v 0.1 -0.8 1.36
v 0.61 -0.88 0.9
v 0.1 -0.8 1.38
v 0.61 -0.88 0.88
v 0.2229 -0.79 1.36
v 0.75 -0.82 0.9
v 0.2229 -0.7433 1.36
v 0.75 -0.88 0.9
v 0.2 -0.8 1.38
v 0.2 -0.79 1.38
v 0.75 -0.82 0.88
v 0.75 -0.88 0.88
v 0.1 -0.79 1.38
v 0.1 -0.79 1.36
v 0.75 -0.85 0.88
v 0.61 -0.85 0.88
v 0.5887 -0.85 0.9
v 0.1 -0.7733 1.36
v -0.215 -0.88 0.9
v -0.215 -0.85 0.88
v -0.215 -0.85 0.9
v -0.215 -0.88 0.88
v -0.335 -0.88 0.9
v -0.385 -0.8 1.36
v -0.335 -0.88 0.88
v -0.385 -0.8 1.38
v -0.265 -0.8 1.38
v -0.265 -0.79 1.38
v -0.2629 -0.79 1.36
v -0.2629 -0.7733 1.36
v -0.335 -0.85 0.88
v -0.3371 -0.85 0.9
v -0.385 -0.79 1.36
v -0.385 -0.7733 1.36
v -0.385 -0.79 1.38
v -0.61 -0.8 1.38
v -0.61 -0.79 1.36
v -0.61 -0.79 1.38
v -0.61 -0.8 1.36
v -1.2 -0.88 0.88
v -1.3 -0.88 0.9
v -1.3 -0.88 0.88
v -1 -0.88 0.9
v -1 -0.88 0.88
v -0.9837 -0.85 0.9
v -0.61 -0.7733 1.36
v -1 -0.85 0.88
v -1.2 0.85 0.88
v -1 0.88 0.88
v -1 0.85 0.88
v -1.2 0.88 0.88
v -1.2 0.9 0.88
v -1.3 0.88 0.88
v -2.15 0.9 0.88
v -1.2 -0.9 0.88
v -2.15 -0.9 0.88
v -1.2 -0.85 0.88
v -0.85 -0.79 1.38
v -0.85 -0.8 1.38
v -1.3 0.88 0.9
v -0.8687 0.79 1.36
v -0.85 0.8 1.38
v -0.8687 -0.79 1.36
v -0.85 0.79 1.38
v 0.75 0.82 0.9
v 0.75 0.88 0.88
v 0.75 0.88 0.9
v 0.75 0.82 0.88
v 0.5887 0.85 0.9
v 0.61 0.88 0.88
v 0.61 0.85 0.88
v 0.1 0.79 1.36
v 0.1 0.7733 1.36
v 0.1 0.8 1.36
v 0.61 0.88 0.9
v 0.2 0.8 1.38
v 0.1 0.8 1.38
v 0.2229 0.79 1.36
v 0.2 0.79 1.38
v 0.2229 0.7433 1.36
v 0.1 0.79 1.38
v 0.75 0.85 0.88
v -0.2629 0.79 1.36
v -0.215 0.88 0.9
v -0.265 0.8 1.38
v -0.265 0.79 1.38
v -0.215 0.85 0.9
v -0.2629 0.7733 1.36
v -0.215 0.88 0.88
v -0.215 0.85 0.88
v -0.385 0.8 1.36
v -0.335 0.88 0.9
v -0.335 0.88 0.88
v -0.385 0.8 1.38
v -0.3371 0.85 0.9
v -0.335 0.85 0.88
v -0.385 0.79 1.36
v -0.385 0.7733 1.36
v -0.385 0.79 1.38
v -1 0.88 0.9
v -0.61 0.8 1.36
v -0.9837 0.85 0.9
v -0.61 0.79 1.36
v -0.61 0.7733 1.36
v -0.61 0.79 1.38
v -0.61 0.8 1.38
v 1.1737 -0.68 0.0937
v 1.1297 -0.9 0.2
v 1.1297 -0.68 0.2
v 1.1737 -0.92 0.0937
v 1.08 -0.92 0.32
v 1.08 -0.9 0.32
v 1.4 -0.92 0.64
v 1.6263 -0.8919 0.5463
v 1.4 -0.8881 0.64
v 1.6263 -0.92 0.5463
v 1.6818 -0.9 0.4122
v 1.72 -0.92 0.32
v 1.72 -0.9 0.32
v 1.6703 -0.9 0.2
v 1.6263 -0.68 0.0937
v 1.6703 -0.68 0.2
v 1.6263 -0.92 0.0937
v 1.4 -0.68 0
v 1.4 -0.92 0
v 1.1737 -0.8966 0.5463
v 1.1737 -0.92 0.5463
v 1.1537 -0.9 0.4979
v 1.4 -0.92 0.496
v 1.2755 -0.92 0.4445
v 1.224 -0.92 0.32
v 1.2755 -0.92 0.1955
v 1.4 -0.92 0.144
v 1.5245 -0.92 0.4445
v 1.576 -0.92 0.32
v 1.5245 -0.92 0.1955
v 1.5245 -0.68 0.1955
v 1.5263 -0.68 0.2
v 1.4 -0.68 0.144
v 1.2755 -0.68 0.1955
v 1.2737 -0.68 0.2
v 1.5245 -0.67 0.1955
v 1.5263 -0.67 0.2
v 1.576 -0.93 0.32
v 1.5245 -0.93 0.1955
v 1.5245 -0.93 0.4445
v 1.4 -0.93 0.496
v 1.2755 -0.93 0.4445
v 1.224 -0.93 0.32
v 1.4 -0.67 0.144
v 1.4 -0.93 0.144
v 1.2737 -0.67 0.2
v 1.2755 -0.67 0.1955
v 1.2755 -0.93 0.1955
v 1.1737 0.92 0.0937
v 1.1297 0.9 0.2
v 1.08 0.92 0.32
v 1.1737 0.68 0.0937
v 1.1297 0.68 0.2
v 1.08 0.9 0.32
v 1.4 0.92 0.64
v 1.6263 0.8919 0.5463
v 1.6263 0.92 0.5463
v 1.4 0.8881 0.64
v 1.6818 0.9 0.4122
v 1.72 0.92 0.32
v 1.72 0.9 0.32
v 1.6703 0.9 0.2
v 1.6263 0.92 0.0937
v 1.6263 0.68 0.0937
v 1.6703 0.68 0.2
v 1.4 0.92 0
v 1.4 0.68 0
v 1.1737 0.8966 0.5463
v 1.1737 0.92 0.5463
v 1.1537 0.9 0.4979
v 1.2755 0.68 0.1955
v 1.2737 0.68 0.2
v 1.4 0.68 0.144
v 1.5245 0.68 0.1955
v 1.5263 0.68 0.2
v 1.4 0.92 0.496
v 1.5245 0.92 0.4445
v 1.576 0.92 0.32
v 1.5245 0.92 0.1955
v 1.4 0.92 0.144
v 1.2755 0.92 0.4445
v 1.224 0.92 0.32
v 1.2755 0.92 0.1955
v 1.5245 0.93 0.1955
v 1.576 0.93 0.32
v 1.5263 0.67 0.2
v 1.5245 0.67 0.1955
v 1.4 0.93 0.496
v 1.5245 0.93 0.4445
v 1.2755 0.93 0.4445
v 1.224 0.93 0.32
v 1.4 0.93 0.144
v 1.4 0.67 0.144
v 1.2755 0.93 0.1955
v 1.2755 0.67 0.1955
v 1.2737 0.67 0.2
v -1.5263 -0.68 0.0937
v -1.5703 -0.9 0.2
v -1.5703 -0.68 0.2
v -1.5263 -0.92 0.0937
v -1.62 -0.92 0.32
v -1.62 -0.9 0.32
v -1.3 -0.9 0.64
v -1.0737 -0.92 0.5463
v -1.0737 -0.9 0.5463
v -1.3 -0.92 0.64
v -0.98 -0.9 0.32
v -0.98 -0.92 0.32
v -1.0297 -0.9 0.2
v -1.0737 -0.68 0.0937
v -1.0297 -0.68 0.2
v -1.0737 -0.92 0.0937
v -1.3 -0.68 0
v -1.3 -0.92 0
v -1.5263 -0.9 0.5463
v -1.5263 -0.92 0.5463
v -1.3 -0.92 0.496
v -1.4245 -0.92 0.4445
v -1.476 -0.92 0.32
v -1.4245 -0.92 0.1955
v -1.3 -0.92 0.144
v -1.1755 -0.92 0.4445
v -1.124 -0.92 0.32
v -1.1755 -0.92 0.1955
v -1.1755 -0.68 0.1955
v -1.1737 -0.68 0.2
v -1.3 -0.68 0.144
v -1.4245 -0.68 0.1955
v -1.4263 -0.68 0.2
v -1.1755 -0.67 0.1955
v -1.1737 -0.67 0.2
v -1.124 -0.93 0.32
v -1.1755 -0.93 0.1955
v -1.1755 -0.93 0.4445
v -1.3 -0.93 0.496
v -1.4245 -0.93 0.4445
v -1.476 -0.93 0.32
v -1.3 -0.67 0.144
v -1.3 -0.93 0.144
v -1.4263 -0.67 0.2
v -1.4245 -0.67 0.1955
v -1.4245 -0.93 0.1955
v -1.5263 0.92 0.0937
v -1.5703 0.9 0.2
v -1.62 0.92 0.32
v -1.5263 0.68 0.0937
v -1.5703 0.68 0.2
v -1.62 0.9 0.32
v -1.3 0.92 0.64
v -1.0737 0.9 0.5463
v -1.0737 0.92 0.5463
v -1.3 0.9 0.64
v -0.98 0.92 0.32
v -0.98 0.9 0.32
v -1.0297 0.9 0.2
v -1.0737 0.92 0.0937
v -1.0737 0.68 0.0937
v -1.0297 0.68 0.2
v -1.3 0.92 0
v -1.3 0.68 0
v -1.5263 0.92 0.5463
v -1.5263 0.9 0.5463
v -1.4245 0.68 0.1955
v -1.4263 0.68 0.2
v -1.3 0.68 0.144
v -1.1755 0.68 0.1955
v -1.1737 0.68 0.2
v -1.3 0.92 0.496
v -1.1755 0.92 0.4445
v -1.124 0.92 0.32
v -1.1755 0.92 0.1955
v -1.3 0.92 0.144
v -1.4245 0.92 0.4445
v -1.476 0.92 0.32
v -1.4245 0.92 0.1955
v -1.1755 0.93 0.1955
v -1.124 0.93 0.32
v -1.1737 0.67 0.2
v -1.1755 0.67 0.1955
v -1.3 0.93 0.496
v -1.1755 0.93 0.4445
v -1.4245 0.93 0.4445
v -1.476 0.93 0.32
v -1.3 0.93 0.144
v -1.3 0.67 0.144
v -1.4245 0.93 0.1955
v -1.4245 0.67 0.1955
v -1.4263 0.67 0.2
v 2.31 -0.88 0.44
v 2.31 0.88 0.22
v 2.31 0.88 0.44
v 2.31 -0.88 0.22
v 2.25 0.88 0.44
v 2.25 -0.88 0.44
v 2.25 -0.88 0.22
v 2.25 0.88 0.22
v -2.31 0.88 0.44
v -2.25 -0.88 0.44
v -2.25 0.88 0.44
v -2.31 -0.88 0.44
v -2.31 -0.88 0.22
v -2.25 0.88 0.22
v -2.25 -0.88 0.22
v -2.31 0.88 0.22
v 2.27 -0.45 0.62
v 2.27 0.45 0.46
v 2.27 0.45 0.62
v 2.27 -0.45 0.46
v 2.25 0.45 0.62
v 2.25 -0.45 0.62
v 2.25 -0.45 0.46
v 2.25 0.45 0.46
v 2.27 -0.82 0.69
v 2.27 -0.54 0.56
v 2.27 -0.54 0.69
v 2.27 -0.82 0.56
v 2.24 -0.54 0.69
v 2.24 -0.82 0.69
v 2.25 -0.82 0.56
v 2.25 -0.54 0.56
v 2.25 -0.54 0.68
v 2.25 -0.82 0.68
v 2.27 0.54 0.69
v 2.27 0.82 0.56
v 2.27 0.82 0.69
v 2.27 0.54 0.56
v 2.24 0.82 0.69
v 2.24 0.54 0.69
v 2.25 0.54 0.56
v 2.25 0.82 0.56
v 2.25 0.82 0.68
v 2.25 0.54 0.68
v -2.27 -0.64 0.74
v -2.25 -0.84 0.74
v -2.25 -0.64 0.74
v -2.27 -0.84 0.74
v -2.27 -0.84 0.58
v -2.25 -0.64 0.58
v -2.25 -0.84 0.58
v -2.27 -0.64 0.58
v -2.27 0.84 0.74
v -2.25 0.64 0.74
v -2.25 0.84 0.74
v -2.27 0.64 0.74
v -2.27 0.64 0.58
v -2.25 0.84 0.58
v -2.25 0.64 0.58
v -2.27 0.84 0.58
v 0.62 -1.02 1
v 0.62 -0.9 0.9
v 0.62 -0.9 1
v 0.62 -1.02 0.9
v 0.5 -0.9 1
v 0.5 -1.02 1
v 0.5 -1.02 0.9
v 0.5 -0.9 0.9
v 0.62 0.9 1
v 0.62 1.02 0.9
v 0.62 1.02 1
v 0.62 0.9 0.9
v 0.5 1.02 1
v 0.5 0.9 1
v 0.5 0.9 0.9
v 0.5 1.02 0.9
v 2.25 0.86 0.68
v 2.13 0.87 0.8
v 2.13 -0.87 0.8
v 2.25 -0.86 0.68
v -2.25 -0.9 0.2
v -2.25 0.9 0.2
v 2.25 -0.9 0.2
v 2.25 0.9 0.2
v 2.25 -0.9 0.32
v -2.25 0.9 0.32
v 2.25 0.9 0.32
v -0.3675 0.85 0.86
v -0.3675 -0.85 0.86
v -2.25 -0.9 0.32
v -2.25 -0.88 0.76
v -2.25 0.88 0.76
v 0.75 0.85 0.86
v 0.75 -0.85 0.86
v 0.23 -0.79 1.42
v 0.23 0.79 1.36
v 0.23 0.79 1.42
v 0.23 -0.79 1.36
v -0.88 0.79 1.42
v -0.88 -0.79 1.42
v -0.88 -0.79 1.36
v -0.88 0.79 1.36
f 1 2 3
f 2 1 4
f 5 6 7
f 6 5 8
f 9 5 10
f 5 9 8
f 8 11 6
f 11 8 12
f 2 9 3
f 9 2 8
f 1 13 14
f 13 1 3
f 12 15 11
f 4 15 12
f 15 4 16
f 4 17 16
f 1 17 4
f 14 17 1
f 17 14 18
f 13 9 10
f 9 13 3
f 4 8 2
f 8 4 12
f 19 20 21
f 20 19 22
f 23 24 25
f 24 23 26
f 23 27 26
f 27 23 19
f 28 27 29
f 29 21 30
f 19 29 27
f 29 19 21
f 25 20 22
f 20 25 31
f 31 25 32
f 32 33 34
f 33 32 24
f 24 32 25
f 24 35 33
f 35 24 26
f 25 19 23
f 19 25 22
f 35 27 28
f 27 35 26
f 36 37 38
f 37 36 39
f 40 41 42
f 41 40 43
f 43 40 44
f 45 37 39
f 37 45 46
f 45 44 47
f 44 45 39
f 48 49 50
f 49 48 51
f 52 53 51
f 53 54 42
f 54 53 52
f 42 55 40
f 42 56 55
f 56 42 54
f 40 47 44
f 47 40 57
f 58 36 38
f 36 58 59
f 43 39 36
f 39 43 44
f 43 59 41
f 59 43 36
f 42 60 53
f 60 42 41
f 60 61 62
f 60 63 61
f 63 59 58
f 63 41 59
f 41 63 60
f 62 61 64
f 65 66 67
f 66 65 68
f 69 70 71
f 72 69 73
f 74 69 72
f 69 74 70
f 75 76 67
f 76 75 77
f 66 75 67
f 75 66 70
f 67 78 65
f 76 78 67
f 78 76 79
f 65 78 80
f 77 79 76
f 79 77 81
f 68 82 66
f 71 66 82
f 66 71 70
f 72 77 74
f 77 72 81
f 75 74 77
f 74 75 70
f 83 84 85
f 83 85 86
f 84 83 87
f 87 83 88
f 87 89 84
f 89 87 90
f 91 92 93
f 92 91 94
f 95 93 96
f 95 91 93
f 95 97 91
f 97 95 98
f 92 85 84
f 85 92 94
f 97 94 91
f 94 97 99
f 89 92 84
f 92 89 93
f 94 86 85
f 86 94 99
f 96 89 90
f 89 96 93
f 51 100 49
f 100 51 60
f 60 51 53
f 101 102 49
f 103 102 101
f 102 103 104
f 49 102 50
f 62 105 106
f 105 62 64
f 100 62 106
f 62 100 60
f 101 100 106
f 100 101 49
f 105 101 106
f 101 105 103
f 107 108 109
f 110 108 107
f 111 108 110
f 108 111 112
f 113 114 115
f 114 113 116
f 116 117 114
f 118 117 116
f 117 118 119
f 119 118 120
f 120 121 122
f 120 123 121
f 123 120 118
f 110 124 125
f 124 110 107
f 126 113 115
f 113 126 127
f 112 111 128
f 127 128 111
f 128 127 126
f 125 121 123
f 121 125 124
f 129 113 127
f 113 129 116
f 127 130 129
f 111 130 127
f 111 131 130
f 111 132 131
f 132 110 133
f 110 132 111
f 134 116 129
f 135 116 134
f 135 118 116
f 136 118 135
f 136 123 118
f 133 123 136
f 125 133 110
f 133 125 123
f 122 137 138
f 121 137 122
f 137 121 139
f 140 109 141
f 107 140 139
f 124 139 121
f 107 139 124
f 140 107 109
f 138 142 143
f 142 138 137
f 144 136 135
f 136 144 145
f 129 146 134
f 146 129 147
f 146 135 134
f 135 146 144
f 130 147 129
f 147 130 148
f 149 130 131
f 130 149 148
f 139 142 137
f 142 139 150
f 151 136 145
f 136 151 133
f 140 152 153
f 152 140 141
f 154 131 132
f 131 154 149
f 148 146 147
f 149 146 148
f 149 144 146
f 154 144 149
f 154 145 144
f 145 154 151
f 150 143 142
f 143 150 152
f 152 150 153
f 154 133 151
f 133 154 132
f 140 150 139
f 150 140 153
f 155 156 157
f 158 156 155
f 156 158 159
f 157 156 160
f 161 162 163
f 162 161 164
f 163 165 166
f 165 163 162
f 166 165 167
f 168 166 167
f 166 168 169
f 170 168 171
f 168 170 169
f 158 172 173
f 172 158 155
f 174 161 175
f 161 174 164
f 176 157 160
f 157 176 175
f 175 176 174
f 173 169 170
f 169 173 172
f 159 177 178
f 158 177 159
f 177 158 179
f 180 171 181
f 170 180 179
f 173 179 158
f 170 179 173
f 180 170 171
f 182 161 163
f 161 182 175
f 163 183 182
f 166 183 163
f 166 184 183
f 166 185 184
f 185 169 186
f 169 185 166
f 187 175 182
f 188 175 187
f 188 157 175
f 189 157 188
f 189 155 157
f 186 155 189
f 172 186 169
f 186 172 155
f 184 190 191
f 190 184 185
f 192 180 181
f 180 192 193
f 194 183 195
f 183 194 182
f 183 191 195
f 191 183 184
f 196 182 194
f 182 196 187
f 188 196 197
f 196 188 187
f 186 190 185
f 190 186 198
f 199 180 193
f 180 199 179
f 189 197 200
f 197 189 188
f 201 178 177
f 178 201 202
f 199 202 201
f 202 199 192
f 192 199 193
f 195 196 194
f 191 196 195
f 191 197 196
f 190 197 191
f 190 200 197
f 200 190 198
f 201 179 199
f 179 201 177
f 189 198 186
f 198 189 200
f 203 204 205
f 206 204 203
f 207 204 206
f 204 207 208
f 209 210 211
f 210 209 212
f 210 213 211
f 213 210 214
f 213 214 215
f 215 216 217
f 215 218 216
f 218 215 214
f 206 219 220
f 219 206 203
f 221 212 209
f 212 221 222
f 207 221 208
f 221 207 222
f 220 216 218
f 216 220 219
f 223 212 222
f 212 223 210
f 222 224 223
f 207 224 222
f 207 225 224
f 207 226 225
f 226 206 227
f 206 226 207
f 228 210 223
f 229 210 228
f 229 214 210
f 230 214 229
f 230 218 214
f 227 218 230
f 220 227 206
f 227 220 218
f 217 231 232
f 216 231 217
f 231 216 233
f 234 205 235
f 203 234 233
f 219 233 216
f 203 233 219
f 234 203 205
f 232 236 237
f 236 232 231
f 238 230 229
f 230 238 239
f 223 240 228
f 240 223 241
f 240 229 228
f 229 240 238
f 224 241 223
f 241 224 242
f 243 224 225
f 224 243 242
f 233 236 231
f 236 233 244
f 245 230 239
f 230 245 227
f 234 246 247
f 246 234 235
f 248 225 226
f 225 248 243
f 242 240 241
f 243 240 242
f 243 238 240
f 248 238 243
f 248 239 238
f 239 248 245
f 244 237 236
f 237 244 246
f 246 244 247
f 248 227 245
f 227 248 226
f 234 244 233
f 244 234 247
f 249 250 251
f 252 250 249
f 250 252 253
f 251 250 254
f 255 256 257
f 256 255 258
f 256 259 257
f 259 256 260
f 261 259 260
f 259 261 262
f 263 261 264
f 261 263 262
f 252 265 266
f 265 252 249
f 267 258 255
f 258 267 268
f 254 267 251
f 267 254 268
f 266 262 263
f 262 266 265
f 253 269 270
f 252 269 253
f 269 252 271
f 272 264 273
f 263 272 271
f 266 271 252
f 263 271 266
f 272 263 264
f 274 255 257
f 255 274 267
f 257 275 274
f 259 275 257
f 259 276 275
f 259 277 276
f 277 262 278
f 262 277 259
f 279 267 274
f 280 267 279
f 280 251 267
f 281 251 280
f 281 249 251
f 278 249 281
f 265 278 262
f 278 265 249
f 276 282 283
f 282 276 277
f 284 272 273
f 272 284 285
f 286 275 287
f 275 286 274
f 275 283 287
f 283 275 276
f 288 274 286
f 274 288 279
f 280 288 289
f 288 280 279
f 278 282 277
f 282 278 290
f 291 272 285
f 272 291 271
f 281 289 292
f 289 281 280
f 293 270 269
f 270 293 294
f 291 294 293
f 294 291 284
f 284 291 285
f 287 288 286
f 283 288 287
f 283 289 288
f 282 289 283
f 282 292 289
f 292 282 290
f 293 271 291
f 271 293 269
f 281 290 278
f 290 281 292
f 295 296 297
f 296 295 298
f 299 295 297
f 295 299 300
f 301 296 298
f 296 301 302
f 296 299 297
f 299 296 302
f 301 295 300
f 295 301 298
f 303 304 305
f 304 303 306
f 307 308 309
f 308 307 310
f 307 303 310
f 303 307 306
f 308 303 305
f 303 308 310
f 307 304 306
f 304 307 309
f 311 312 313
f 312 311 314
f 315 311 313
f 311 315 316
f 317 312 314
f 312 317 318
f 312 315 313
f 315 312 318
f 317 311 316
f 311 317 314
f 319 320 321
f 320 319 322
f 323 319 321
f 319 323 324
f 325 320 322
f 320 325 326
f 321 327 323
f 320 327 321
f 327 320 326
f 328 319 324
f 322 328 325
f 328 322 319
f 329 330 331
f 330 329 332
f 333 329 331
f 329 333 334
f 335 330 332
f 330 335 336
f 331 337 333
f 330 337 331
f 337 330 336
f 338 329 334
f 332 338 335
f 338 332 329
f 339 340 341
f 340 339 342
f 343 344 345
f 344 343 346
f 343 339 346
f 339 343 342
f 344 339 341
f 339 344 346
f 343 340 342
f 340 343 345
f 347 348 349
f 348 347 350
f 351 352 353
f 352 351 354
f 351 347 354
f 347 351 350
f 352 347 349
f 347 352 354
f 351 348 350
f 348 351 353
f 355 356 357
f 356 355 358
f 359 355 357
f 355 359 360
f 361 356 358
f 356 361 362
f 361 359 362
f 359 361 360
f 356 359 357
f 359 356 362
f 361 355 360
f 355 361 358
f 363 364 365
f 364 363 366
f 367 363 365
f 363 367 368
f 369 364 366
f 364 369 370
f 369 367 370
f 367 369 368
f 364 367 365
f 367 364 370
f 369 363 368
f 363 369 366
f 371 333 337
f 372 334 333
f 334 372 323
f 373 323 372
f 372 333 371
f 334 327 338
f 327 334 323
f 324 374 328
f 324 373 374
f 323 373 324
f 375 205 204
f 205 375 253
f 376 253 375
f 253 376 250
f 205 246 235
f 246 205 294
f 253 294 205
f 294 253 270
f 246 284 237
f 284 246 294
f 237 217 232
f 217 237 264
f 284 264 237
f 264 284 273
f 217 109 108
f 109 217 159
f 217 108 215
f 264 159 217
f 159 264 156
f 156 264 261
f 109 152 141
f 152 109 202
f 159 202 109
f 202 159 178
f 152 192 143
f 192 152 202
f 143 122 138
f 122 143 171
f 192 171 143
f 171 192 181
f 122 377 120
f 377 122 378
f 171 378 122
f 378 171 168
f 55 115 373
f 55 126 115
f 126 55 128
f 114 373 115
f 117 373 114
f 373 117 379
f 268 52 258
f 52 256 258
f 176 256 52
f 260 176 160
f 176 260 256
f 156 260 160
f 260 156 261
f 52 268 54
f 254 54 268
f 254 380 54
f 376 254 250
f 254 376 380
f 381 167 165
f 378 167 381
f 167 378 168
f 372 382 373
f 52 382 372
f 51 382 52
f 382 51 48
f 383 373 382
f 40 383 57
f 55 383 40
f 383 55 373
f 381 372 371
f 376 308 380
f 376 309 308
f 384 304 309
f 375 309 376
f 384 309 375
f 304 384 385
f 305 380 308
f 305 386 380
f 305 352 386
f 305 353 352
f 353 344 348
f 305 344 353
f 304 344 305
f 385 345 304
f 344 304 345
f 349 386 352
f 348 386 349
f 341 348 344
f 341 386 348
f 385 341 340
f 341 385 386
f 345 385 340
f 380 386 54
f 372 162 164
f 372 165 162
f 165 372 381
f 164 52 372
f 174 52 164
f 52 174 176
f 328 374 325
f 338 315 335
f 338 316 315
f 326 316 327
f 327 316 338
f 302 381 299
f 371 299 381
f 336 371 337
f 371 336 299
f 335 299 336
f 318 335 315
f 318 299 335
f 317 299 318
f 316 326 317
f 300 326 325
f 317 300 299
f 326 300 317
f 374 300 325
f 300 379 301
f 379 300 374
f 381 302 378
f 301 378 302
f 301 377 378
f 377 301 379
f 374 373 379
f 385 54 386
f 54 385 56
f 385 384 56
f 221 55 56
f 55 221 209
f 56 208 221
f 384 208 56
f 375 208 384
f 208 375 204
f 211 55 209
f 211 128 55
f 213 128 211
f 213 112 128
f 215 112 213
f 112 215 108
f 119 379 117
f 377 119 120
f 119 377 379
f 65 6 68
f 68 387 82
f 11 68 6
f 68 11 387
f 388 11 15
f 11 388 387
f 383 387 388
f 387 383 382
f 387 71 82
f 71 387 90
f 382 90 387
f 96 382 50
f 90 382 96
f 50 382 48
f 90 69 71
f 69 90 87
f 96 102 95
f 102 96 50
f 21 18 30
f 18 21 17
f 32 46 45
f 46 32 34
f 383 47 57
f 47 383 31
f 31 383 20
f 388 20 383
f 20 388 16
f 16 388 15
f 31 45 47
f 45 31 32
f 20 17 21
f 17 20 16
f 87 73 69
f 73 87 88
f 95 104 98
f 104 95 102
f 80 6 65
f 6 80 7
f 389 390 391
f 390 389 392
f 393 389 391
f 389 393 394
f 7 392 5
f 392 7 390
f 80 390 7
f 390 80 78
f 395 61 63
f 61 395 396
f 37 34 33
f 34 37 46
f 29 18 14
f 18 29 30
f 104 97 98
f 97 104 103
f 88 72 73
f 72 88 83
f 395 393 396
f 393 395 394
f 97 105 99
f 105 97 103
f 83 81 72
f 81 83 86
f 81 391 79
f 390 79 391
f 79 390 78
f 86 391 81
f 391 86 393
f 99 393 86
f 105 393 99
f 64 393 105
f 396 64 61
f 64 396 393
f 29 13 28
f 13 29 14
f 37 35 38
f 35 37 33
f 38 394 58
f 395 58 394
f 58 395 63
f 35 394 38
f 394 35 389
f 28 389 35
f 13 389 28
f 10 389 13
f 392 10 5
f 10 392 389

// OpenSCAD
// file: lib/car_kit.scad
// Car kit — the parts every road vehicle shares (car_sedan.scad,
// car_minisuv.scad, car_suv.scad, car_jeep.scad, car_van.scad), which
// differ in their proportions. world.CarKind names them; the renderer
// draws each kind from its own mesh, tinted per car, with a roof rack or
// box (car_roof_rack.scad, car_roof_box.scad) set on the roof at the
// height in render.carRoofs.
//
//   +X = forward (the car's front faces +X)
//   +Y = lateral (driver's left when facing +X)
//   +Z = up
//
// The paint is near white so the per-car tint is the paint colour;
// glass, tyres, trim and lights are dark or bright enough to read
// through any tint.
//
// Conventions, units, and axis docs: see models-src/README.md.

$fn = 8;

paint  = [0.92, 0.92, 0.92];
glass  = [0.30, 0.40, 0.50];
trim   = [0.16, 0.16, 0.17]; // bumpers, grille, rails, mirrors
tyre   = [0.08, 0.08, 0.08];
hubcap = [0.55, 0.56, 0.58];
lamp   = [1.00, 0.96, 0.82];
tail   = [0.80, 0.12, 0.10];

// slab is a thin box from x0 to x1, centred in Y, its top at z.
module slab(x0, x1, w, z, t = 0.04) {
    translate([x0, -w / 2, z - t]) cube([x1 - x0, w, t]);
}

module wheel(x, y, r, t) {
    translate([x, y, r]) rotate([90, 0, 0]) {
        color(tyre) cylinder(h = t, r = r, center = true);
        color(hubcap) cylinder(h = t + 0.02, r = r * 0.55, center = true);
    }
}

// vehicle draws one car.
//   len, w        overall body length and width
//   r, wb         wheel radius and wheelbase (axles centred on x = axle_x)
//   sill          height of the body's underside
//   belt          the beltline: top of the doors, bottom of the glass
//   hood          top of the hood at the nose (below belt slopes it)
//   nose, tailin  how far the top of the body is drawn in from the
//                 front and back ends (rounding them)
//   roof          roof height
//   gb            [x0, x1] the glass at the beltline
//   gr            [x0, x1] the glass at the roof
//   rails         roof rails (SUVs)
module vehicle(len, w, r, wb, sill, belt, hood, nose, tailin, roof, gb, gr,
               axle_x = 0, rails = false) {
    // Body: a hull from the full-length underside to the beltline at the
    // back and the hood at the nose.
    color(paint) hull() {
        slab(-len / 2, len / 2, w, sill + 0.12, 0.12);
        slab(-len / 2 + tailin, gb[0] + 0.1, w, belt);
        slab(gb[1] - 0.1, len / 2 - nose, w - 0.06, hood);
        slab(-len / 2, -len / 2 + 0.05, w - 0.04, belt - 0.12);
        slab(len / 2 - 0.05, len / 2, w - 0.08, hood - 0.12);
    }
    // Glass greenhouse, and the painted roof on it.
    color(glass) hull() {
        slab(gb[0], gb[1], w - 0.10, belt + 0.02, 0.04);
        slab(gr[0], gr[1], w - 0.26, roof - 0.04, 0.04);
    }
    color(paint) slab(gr[0] - 0.03, gr[1] + 0.03, w - 0.22, roof, 0.06);
    // Pillars down the sides of the glass: the windshield's (A), between
    // the doors (B), and a broad one at the back (C).
    color(paint) for (s = [-1, 1]) {
        pillar(gb[1] - 0.14, gb[1], gr[1] - 0.10, gr[1], s);
        pillar((gb[0] + gb[1]) / 2 - 0.06, (gb[0] + gb[1]) / 2 + 0.06,
               (gr[0] + gr[1]) / 2 - 0.06, (gr[0] + gr[1]) / 2 + 0.06, s);
        pillar(gb[0], gb[0] + 0.30, gr[0], gr[0] + 0.24, s);
    }
    module pillar(b0, b1, r0, r1, s) hull() {
        translate([b0, s * (w - 0.10) / 2 - 0.03, belt]) cube([b1 - b0, 0.06, 0.02]);
        translate([r0, s * (w - 0.26) / 2 - 0.03, roof - 0.06]) cube([r1 - r0, 0.06, 0.02]);
    }
    if (rails)
        color(trim) for (s = [-1, 1])
            translate([gr[0] + 0.05, s * (w / 2 - 0.2) - 0.03, roof])
                cube([gr[1] - gr[0] - 0.1, 0.06, 0.06]);

    // Wheels, flush with the body sides.
    t = 0.24;
    for (x = [axle_x + wb / 2, axle_x - wb / 2], s = [-1, 1])
        wheel(x, s * (w / 2 - t / 2 + 0.02), r, t);

    // Bumpers, grille, lights.
    bz = sill + 0.02;
    color(trim) {
        translate([len / 2 - 0.08, -w / 2 + 0.02, bz]) cube([0.14, w - 0.04, 0.22]);
        translate([-len / 2 - 0.06, -w / 2 + 0.02, bz]) cube([0.14, w - 0.04, 0.22]);
        translate([len / 2 - 0.03, -w * 0.25, bz + 0.24]) cube([0.05, w * 0.5, max(hood - bz - 0.42, 0.12)]);
    }
    lz = hood - 0.16;
    color(lamp) for (s = [-1, 1])
        translate([len / 2 - 0.04, s * (w / 2 - 0.22) - 0.14, lz - 0.08]) cube([0.06, 0.28, 0.13]);
    color(tail) for (s = [-1, 1])
        translate([-len / 2 - 0.02, s * (w / 2 - 0.16) - 0.10, belt - 0.30]) cube([0.06, 0.20, 0.16]);
    // Mirrors.
    color(trim) for (s = [-1, 1])
        translate([gb[1] - 0.25, s * (w / 2 + 0.06) - 0.06, belt + 0.02]) cube([0.12, 0.12, 0.10]);

    echo("MOGUL_META", "footprint", len / 2, w / 2 + 0.08);
}
// main file
// Sedan — a four-door saloon: long hood, glass set back, a trunk.
// Seats four. Parts and conventions: lib/car_kit.scad.
include <lib/car_kit.scad>

vehicle(len = 4.50, w = 1.80, r = 0.32, wb = 2.70, sill = 0.20,
        belt = 0.88, hood = 0.80, nose = 0.12, tailin = 0.10,
        roof = 1.42, gb = [-1.30, 0.75], gr = [-0.85, 0.20], axle_x = 0.05);
